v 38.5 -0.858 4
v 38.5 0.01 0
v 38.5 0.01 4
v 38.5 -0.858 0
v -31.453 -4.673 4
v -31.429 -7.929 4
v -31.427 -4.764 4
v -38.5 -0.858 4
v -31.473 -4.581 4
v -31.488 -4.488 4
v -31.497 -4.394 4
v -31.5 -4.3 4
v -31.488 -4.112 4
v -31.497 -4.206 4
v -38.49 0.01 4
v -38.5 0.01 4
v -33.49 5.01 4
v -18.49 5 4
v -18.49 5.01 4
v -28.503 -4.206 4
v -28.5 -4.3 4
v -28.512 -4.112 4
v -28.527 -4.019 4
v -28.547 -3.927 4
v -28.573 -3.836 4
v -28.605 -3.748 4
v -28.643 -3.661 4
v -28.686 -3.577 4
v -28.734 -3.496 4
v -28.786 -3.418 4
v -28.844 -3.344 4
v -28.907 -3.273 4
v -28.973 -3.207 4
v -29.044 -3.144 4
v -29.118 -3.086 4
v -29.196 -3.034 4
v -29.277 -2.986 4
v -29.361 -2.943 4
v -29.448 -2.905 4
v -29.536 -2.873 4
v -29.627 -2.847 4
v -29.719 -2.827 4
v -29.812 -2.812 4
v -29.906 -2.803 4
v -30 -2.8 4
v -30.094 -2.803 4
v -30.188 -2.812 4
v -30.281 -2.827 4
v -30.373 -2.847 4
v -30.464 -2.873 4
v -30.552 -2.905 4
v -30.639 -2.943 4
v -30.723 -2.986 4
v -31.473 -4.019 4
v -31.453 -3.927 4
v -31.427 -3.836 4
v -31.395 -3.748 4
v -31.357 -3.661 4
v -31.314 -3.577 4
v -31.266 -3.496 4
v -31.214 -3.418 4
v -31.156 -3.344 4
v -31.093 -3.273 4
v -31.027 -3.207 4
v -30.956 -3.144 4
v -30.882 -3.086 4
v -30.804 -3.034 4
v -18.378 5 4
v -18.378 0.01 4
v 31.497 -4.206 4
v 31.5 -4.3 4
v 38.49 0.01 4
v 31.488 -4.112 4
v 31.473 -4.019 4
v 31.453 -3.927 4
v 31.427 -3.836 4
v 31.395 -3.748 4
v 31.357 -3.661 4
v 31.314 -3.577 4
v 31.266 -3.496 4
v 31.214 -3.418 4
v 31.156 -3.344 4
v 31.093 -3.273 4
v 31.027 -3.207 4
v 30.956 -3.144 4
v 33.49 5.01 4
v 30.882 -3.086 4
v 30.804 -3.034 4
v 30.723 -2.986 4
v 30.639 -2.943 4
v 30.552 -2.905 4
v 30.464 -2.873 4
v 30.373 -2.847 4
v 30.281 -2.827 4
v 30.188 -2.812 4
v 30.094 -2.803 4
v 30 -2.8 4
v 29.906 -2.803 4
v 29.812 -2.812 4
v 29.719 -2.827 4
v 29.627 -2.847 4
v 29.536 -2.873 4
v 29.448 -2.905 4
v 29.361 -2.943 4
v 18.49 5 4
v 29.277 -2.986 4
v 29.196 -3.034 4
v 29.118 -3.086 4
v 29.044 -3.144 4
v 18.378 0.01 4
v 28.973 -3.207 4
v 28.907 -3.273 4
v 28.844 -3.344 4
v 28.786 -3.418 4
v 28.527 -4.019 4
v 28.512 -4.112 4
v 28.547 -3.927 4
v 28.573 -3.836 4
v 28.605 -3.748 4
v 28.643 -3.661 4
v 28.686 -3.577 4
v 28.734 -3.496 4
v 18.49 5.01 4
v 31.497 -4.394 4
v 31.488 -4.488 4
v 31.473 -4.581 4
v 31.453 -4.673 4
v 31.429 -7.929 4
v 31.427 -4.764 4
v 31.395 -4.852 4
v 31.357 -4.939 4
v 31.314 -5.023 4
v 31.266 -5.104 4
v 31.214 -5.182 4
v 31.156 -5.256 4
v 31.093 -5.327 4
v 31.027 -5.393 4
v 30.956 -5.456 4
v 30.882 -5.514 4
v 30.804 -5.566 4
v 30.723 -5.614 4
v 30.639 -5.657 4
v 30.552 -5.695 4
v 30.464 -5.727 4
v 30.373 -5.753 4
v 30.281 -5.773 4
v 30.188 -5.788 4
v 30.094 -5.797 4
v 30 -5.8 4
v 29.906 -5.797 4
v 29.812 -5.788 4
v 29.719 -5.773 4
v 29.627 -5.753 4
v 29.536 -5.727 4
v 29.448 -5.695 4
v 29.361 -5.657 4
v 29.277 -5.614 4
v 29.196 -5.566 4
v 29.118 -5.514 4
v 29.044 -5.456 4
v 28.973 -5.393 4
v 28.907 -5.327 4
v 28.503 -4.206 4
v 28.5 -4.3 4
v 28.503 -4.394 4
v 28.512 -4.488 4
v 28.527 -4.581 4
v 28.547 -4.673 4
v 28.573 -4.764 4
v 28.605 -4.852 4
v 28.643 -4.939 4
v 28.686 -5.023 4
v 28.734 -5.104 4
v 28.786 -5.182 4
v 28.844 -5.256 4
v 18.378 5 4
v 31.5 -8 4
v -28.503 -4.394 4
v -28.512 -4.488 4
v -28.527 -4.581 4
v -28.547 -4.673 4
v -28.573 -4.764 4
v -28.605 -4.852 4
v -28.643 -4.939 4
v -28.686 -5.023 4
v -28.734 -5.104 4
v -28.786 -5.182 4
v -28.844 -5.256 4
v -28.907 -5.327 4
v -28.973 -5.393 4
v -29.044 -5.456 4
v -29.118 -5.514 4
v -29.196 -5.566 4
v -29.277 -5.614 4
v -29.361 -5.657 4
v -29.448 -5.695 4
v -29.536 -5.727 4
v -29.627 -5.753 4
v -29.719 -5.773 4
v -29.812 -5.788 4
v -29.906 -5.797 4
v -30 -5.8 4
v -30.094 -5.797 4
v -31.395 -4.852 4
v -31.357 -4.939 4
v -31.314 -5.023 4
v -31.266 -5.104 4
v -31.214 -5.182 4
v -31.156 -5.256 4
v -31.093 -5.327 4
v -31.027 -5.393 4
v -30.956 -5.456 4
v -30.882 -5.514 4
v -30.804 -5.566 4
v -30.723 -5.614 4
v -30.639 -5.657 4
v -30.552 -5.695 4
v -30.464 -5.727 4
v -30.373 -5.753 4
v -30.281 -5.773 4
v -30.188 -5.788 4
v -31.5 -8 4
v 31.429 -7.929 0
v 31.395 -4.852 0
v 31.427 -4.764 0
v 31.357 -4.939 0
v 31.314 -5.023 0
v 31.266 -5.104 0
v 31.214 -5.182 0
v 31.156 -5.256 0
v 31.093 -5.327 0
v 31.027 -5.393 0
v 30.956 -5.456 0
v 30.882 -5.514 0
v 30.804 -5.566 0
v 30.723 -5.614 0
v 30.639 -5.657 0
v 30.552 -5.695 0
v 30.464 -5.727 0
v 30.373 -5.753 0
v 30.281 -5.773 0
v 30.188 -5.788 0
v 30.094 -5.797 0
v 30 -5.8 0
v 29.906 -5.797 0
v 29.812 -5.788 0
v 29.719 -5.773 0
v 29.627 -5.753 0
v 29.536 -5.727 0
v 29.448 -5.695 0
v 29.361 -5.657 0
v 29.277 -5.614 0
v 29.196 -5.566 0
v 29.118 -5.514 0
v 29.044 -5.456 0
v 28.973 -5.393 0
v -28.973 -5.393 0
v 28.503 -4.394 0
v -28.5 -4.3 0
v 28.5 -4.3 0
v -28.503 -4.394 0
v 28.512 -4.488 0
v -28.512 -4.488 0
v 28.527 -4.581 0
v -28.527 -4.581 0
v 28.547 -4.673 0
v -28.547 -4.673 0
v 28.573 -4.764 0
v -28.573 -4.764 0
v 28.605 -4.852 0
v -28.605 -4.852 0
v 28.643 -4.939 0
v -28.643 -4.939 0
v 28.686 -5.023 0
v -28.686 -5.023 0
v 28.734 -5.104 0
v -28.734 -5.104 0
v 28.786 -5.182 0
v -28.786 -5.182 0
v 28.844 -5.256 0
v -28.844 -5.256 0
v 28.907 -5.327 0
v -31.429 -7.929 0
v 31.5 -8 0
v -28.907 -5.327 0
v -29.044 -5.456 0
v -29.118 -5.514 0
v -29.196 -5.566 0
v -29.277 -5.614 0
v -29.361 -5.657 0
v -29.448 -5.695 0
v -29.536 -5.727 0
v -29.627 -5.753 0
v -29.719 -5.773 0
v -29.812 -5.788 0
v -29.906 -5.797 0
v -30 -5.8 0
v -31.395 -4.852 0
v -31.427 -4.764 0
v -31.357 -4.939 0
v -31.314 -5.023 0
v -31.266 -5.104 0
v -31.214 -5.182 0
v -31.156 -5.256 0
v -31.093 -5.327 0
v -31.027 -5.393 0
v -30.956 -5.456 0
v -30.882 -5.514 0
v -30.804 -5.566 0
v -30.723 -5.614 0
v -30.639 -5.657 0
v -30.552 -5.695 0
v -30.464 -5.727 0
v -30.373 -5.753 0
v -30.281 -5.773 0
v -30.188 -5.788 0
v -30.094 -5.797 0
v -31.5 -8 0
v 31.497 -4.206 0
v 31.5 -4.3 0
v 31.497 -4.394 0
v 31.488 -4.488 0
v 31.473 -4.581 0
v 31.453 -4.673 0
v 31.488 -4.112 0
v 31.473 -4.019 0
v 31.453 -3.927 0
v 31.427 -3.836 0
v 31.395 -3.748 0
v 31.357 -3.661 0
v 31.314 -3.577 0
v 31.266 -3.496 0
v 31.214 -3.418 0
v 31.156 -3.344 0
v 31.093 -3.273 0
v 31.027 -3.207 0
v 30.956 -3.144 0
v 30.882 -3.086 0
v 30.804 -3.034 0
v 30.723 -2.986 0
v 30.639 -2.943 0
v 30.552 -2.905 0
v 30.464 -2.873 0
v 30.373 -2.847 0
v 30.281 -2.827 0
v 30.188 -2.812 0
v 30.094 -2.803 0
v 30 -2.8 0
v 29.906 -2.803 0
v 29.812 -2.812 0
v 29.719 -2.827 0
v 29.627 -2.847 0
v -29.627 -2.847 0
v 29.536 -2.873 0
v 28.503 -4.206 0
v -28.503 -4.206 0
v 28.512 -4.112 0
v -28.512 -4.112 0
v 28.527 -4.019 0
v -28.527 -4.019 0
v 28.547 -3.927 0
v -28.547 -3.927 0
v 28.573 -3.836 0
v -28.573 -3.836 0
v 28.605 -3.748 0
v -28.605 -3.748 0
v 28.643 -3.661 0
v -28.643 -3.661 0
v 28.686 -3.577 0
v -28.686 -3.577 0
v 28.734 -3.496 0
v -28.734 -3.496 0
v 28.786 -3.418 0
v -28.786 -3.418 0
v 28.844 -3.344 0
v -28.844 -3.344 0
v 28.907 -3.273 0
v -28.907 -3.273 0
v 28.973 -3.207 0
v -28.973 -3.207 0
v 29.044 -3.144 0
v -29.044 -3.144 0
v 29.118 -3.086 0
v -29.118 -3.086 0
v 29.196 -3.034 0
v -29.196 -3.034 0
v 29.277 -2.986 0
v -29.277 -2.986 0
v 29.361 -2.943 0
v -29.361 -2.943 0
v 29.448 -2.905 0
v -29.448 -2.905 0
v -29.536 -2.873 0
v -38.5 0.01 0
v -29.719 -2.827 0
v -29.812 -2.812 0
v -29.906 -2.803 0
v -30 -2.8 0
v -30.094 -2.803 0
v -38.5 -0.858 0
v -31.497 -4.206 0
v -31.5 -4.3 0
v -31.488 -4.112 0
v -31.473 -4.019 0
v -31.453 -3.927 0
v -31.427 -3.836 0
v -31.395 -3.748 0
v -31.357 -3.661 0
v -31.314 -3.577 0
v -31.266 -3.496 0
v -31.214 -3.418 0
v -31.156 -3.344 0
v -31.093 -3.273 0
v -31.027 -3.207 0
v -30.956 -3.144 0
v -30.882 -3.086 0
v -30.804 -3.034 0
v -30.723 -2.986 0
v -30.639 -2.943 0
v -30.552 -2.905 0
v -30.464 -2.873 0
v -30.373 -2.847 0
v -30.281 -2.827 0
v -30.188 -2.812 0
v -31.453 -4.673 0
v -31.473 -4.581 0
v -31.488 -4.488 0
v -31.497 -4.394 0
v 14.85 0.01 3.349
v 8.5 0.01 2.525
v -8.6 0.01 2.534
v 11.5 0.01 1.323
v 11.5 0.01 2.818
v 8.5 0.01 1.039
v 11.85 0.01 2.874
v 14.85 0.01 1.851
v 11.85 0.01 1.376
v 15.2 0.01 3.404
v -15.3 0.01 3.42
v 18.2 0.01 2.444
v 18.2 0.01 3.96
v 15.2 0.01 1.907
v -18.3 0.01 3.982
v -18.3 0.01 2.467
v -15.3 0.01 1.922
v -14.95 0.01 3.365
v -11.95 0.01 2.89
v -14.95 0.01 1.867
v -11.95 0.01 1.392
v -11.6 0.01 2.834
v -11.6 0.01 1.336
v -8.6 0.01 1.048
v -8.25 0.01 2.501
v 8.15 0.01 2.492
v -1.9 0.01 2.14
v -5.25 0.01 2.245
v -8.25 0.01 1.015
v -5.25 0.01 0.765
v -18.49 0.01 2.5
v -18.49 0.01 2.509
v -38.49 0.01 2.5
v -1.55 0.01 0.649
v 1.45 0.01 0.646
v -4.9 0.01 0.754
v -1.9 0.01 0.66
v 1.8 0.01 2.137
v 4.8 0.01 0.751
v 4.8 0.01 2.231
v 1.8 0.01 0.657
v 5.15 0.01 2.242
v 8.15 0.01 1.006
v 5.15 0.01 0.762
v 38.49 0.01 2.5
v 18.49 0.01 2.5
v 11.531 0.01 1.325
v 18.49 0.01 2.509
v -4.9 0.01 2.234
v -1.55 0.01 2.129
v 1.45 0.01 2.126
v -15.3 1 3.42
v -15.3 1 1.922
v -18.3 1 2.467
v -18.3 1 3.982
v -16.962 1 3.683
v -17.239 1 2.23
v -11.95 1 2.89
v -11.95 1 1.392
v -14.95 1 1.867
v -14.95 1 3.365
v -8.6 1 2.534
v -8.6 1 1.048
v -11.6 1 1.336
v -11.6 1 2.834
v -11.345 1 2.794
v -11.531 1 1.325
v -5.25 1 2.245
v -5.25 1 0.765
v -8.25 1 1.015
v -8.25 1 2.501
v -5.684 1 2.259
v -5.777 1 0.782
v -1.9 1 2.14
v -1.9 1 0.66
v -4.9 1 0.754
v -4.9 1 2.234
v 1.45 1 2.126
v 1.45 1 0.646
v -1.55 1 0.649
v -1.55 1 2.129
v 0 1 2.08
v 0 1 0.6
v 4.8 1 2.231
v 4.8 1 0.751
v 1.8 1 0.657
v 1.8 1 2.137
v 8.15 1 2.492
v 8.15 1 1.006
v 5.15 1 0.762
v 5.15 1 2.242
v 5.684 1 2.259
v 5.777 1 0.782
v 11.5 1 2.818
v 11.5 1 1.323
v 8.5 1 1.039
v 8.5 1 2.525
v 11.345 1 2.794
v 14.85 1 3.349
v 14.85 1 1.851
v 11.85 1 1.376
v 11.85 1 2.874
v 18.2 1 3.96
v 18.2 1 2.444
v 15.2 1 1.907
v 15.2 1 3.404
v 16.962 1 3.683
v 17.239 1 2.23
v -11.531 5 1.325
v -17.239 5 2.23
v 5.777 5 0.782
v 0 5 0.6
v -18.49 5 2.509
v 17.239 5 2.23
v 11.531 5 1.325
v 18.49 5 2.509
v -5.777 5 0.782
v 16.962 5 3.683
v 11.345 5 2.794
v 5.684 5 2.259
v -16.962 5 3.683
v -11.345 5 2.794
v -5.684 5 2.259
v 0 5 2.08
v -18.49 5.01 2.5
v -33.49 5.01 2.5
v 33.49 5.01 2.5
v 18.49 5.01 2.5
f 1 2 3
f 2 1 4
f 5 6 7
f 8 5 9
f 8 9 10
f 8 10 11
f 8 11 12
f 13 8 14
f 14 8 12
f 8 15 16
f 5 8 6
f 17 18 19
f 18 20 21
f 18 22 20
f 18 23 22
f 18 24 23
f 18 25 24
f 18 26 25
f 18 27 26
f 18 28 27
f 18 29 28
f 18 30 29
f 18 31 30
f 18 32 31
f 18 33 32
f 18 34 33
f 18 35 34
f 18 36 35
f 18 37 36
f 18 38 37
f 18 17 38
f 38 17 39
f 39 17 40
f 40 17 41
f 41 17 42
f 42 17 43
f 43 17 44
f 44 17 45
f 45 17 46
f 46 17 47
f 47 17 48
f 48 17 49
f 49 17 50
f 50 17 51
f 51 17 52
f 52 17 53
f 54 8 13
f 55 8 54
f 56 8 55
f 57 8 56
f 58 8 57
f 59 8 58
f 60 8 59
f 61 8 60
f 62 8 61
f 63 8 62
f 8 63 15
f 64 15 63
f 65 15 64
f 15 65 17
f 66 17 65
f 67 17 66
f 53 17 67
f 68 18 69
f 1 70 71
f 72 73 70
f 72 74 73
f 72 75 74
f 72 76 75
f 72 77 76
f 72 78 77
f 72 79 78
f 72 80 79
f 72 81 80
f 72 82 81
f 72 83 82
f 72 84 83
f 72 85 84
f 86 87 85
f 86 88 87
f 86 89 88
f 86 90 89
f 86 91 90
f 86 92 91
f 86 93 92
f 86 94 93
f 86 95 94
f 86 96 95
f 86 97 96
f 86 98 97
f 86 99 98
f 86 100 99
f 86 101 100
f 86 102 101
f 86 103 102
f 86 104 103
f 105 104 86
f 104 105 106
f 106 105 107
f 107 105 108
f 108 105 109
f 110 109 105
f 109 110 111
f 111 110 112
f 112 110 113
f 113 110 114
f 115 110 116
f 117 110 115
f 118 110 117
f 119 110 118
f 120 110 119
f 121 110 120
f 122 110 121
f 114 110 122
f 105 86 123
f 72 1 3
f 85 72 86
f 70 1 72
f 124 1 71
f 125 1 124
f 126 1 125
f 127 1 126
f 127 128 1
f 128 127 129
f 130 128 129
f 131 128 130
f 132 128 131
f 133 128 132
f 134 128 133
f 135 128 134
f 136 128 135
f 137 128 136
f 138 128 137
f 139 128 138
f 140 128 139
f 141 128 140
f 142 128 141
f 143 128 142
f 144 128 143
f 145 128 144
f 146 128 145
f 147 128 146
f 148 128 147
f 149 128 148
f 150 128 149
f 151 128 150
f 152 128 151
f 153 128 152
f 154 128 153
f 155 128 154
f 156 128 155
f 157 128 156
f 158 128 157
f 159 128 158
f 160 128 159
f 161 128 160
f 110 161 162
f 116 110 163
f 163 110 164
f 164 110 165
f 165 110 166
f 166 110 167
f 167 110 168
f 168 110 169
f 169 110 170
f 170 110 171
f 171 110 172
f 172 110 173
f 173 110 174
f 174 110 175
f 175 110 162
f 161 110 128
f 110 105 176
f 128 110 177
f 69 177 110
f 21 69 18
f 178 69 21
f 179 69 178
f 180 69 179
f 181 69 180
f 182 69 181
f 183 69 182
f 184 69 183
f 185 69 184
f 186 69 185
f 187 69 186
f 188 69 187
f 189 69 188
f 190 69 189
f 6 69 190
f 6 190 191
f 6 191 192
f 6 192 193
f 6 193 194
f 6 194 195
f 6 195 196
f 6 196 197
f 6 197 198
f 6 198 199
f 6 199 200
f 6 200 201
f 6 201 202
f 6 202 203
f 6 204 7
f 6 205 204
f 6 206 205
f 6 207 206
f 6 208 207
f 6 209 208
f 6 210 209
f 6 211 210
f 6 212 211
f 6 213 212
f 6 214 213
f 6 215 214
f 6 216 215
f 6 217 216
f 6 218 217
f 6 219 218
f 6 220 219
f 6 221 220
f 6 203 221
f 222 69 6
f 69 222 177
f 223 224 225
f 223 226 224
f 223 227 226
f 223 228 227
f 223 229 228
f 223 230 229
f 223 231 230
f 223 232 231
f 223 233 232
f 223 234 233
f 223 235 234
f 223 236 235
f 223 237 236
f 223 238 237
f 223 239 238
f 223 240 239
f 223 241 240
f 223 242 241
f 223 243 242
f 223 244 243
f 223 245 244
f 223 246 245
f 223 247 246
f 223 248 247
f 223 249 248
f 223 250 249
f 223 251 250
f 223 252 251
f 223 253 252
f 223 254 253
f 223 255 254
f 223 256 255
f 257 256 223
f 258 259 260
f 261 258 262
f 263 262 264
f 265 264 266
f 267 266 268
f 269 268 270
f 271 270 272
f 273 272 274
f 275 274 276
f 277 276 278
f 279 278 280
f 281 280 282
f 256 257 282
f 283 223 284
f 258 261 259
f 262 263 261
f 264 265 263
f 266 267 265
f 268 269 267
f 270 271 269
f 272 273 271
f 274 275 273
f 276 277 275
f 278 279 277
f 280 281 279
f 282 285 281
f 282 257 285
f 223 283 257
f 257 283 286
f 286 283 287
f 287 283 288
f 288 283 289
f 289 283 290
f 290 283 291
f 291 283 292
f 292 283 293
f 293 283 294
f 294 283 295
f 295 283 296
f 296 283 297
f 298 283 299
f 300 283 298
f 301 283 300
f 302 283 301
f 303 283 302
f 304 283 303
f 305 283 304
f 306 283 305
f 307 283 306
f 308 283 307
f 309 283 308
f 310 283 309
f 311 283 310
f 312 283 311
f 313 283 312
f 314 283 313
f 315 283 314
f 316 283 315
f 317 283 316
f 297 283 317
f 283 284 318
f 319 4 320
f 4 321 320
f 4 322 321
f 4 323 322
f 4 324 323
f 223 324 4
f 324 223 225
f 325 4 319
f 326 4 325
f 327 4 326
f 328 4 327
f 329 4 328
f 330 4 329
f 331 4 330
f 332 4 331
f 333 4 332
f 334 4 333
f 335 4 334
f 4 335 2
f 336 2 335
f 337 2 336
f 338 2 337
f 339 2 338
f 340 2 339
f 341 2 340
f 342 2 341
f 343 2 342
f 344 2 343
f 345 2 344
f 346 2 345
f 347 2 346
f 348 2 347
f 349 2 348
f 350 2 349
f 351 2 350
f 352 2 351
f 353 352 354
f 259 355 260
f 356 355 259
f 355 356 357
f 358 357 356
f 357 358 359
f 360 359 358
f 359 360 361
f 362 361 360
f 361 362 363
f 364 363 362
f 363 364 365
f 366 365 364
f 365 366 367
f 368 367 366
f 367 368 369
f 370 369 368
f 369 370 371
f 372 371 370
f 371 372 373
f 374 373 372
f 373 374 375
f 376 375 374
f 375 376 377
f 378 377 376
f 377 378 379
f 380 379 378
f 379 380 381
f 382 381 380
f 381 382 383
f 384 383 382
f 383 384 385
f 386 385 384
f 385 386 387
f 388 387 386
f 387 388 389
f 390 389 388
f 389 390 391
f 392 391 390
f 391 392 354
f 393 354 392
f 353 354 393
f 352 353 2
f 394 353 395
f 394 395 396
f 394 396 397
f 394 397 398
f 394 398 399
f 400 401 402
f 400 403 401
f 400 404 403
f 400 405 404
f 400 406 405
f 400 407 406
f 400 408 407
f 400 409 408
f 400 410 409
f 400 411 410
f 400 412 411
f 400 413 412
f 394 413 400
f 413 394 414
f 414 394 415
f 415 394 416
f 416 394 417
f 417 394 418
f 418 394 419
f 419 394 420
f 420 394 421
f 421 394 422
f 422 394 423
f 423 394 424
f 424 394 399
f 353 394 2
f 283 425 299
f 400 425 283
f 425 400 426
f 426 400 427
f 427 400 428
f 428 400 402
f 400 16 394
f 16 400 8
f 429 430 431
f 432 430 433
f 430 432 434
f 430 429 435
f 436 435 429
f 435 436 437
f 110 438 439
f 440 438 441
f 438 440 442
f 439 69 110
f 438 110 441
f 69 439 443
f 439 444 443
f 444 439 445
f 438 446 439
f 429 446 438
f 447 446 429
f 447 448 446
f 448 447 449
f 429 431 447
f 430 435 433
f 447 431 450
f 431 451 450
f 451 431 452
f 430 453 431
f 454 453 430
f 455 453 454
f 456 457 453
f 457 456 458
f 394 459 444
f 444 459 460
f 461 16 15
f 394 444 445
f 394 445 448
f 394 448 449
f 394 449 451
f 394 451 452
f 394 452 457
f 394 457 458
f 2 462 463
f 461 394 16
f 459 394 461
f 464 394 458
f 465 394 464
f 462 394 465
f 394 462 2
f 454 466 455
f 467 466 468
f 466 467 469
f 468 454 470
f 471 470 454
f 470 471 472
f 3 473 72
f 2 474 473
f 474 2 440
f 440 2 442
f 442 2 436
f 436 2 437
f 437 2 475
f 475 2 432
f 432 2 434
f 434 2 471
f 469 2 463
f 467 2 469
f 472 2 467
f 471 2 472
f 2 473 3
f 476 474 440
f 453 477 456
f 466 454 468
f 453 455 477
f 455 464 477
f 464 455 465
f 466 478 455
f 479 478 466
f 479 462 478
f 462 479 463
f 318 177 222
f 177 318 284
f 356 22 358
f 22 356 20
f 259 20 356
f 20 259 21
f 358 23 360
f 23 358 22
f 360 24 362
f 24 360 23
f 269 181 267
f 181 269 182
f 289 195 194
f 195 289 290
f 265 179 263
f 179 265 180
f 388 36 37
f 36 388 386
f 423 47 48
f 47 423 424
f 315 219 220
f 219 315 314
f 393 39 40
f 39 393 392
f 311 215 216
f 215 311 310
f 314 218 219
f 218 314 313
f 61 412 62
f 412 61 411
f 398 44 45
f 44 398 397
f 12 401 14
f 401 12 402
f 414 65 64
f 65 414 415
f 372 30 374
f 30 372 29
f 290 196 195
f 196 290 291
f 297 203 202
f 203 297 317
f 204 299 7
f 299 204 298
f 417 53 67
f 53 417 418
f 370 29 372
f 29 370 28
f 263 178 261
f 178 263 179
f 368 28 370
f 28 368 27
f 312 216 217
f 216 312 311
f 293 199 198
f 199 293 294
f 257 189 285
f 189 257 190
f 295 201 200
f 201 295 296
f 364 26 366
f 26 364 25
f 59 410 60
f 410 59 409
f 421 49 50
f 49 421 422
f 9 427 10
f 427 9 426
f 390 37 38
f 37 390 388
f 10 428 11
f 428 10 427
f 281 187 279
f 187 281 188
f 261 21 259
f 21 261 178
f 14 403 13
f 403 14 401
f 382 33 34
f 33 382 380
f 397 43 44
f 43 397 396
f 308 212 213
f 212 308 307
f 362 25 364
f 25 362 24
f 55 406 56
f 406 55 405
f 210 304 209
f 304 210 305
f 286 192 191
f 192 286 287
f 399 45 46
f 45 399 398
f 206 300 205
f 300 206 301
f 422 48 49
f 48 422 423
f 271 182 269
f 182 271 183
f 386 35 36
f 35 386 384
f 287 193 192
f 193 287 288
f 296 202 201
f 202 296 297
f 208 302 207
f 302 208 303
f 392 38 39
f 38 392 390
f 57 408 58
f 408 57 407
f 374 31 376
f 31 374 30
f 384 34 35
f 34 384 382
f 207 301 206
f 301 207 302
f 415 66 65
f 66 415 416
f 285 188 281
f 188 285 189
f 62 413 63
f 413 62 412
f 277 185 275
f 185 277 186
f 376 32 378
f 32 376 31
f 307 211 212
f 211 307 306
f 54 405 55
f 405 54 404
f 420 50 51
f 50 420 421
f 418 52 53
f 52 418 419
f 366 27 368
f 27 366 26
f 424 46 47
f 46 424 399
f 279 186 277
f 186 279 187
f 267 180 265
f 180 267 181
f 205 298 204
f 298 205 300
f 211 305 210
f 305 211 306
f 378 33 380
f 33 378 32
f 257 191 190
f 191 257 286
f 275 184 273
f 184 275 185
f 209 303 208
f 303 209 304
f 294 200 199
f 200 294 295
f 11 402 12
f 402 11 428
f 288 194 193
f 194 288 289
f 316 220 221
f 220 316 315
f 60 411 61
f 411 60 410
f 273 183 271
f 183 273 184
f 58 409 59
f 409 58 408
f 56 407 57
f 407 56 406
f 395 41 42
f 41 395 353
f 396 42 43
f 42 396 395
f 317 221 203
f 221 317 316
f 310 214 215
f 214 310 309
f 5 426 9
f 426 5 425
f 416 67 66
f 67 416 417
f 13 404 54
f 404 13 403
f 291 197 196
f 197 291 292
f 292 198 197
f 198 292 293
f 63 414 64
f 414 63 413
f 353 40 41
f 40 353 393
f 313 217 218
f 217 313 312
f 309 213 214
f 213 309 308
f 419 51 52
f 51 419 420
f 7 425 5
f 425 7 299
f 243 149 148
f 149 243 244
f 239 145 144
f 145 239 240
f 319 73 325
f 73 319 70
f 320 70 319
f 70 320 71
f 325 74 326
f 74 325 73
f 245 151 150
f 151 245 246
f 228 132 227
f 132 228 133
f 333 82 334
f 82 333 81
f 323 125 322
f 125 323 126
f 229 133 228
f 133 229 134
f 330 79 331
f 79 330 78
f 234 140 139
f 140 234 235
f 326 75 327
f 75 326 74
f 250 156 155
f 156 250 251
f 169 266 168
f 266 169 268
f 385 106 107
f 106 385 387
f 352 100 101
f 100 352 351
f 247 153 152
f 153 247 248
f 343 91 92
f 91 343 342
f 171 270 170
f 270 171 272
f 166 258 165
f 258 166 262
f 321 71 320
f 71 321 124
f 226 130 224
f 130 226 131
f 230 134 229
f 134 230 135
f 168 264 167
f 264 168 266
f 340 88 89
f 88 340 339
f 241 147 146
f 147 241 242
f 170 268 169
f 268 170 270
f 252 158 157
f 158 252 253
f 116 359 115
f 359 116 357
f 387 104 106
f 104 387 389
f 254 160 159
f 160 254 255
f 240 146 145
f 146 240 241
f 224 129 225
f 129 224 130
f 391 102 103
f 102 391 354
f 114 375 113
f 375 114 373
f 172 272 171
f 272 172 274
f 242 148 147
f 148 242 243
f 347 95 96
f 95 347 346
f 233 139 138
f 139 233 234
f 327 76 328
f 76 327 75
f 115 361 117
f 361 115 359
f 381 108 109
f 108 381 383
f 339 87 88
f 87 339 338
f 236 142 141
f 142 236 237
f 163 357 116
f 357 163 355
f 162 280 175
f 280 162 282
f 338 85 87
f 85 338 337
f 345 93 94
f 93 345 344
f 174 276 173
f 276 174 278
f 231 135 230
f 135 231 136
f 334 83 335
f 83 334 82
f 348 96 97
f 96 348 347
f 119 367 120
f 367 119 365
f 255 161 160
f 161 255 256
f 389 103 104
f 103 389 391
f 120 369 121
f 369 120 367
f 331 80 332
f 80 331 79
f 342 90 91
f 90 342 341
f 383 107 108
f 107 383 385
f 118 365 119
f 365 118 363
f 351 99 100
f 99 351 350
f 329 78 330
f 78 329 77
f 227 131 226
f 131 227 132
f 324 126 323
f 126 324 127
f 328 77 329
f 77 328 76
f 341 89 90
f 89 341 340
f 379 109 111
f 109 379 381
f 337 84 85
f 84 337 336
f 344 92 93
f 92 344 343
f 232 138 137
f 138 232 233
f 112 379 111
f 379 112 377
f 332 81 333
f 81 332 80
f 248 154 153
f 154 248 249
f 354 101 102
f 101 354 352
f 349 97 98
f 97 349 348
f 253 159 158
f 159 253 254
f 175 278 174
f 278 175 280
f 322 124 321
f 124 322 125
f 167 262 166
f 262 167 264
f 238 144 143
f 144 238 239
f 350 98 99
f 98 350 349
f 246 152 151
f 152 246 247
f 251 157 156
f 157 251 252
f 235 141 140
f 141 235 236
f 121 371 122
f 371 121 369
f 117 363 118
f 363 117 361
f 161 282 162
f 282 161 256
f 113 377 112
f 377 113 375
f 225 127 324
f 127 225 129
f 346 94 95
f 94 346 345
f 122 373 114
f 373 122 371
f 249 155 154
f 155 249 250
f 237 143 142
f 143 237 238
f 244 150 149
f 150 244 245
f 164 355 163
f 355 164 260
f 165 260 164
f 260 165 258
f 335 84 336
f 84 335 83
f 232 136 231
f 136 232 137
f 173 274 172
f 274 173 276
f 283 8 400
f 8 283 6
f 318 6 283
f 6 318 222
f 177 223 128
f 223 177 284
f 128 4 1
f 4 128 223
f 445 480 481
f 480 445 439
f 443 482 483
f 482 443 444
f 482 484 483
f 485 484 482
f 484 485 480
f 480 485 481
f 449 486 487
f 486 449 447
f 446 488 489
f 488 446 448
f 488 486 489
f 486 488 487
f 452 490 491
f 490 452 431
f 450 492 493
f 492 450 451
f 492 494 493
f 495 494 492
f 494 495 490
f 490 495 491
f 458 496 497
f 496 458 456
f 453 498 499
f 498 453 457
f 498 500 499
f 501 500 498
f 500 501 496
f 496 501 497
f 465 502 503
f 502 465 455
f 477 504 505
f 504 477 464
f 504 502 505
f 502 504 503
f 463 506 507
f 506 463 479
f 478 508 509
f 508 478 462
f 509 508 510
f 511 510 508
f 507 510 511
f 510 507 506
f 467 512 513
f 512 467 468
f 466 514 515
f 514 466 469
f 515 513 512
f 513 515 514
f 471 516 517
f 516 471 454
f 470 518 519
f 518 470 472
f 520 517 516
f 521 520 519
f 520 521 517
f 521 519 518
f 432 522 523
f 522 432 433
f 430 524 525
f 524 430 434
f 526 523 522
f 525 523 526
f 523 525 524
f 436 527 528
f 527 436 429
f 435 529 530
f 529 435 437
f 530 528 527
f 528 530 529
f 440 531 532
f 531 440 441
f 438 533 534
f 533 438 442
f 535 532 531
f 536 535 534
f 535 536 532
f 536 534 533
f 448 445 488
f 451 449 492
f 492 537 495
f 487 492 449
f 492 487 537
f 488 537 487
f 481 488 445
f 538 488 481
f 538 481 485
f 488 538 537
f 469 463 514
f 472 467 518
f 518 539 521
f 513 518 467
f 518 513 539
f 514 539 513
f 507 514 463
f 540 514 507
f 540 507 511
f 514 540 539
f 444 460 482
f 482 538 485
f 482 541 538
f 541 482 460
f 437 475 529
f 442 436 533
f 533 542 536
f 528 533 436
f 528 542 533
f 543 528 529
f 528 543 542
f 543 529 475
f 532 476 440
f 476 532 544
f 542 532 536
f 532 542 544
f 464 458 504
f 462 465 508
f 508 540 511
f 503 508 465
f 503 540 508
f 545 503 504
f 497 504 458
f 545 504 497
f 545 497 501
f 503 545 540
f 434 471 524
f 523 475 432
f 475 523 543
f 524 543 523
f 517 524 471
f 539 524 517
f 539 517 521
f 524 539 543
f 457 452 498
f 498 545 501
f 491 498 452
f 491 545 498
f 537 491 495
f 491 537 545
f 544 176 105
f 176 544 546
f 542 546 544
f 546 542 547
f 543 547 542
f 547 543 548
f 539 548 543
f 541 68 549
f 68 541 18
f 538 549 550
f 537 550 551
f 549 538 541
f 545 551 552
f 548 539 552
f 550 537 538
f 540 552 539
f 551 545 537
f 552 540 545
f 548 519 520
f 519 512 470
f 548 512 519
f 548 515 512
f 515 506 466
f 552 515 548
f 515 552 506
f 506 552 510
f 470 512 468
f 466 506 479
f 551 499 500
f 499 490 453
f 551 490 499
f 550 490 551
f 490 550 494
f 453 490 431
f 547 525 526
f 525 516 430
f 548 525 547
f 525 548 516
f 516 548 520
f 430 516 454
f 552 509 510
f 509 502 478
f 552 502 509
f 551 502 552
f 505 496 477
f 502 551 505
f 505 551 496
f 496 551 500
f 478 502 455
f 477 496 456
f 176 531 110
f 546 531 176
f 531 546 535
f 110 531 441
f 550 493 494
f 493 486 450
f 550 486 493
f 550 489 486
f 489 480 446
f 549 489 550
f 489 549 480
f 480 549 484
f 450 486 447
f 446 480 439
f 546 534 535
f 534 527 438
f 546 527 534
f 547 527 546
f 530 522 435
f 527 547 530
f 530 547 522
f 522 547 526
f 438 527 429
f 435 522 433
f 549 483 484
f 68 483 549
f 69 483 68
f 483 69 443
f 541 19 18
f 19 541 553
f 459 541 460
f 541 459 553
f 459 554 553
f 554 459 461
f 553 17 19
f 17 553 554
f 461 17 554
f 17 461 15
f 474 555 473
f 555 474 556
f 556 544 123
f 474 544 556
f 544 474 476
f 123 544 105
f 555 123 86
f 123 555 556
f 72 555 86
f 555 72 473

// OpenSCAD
//
// Filter Slot for Formatt Hitech 67mm Filter
// Copyright (C) 2021 Uwe Glässner
//

// slot lengths (mm)
l = 77; // total length
l1 = 20;  // length until curve 
// slot widths (mm)
w1 = 8;
w2 = 1.0;
w3 = 4.0;
w  = w1+w2+w3;
// slot height (mm)
h1 = 1.5; // curvature thickness
cr = 92; // curvature radius
of = 0.6; // curvature offset for 2mm firecrest filters (instead of 1.4mm Resin) 
h = 4; // total height

D = 0.01; // generic overlap of parts.

module loch(posx,posy){
    union(){
       translate([posx, posy,-D]) cylinder(d=3, h=h+2*D, $fn=100);
    }
}


// thick side of holder with holes and removed corners
difference(){
   translate([-l/2,-w1,0]) cube([l,w1+D,h]);
   loch(-l/2+8.5, -8+3.7); 
   loch( l/2-8.5, -8+3.7); 

   translate([-l/2,-15,-D]) rotate([0,0,45]) cube([10,10,h+2*D]);

   translate([l/2,-15,-D]) rotate([0,0,45]) cube([10,10,h+2*D]);
   }

// Arc on thin side
intersection(){
    translate([-l/2,0,0]) cube([l,w2+w3,h]);
    difference(){
       translate([0,w3+w2,cr+of]) rotate ([90,90,0]) cylinder(r=cr,h=w3+w2, $fn=100);
       translate([0,w3+w2+D,cr+of]) rotate ([90,90,0]) cylinder(r=cr-h1+2*D,h=w3+w2+2*D, $fn=100);
       // remove pillars under bridge
       for (i=[0:10]) translate([-l/2+l1+i*3.35+0.2,0,-D+of/2]) cube([3.0,w2,h]);
    }
}  
        
// Add thin sides with removed corners
difference(){
   translate([-l/2-D,0,h-h1]) cube([l1+2*D,w2+w3+D,h1]);
   translate([-l/2-1,-1,-D]) rotate([0,0,45]) cube([10,10,h+2*D]);   
}
difference(){
   translate([ l/2-l1-D,0,h-h1]) cube([l1+2*D,w2+w3+D,h1]);
   translate([l/2+1,-1,-D]) rotate([0,0,45]) cube([10,10,h+2*D]);
}





 
